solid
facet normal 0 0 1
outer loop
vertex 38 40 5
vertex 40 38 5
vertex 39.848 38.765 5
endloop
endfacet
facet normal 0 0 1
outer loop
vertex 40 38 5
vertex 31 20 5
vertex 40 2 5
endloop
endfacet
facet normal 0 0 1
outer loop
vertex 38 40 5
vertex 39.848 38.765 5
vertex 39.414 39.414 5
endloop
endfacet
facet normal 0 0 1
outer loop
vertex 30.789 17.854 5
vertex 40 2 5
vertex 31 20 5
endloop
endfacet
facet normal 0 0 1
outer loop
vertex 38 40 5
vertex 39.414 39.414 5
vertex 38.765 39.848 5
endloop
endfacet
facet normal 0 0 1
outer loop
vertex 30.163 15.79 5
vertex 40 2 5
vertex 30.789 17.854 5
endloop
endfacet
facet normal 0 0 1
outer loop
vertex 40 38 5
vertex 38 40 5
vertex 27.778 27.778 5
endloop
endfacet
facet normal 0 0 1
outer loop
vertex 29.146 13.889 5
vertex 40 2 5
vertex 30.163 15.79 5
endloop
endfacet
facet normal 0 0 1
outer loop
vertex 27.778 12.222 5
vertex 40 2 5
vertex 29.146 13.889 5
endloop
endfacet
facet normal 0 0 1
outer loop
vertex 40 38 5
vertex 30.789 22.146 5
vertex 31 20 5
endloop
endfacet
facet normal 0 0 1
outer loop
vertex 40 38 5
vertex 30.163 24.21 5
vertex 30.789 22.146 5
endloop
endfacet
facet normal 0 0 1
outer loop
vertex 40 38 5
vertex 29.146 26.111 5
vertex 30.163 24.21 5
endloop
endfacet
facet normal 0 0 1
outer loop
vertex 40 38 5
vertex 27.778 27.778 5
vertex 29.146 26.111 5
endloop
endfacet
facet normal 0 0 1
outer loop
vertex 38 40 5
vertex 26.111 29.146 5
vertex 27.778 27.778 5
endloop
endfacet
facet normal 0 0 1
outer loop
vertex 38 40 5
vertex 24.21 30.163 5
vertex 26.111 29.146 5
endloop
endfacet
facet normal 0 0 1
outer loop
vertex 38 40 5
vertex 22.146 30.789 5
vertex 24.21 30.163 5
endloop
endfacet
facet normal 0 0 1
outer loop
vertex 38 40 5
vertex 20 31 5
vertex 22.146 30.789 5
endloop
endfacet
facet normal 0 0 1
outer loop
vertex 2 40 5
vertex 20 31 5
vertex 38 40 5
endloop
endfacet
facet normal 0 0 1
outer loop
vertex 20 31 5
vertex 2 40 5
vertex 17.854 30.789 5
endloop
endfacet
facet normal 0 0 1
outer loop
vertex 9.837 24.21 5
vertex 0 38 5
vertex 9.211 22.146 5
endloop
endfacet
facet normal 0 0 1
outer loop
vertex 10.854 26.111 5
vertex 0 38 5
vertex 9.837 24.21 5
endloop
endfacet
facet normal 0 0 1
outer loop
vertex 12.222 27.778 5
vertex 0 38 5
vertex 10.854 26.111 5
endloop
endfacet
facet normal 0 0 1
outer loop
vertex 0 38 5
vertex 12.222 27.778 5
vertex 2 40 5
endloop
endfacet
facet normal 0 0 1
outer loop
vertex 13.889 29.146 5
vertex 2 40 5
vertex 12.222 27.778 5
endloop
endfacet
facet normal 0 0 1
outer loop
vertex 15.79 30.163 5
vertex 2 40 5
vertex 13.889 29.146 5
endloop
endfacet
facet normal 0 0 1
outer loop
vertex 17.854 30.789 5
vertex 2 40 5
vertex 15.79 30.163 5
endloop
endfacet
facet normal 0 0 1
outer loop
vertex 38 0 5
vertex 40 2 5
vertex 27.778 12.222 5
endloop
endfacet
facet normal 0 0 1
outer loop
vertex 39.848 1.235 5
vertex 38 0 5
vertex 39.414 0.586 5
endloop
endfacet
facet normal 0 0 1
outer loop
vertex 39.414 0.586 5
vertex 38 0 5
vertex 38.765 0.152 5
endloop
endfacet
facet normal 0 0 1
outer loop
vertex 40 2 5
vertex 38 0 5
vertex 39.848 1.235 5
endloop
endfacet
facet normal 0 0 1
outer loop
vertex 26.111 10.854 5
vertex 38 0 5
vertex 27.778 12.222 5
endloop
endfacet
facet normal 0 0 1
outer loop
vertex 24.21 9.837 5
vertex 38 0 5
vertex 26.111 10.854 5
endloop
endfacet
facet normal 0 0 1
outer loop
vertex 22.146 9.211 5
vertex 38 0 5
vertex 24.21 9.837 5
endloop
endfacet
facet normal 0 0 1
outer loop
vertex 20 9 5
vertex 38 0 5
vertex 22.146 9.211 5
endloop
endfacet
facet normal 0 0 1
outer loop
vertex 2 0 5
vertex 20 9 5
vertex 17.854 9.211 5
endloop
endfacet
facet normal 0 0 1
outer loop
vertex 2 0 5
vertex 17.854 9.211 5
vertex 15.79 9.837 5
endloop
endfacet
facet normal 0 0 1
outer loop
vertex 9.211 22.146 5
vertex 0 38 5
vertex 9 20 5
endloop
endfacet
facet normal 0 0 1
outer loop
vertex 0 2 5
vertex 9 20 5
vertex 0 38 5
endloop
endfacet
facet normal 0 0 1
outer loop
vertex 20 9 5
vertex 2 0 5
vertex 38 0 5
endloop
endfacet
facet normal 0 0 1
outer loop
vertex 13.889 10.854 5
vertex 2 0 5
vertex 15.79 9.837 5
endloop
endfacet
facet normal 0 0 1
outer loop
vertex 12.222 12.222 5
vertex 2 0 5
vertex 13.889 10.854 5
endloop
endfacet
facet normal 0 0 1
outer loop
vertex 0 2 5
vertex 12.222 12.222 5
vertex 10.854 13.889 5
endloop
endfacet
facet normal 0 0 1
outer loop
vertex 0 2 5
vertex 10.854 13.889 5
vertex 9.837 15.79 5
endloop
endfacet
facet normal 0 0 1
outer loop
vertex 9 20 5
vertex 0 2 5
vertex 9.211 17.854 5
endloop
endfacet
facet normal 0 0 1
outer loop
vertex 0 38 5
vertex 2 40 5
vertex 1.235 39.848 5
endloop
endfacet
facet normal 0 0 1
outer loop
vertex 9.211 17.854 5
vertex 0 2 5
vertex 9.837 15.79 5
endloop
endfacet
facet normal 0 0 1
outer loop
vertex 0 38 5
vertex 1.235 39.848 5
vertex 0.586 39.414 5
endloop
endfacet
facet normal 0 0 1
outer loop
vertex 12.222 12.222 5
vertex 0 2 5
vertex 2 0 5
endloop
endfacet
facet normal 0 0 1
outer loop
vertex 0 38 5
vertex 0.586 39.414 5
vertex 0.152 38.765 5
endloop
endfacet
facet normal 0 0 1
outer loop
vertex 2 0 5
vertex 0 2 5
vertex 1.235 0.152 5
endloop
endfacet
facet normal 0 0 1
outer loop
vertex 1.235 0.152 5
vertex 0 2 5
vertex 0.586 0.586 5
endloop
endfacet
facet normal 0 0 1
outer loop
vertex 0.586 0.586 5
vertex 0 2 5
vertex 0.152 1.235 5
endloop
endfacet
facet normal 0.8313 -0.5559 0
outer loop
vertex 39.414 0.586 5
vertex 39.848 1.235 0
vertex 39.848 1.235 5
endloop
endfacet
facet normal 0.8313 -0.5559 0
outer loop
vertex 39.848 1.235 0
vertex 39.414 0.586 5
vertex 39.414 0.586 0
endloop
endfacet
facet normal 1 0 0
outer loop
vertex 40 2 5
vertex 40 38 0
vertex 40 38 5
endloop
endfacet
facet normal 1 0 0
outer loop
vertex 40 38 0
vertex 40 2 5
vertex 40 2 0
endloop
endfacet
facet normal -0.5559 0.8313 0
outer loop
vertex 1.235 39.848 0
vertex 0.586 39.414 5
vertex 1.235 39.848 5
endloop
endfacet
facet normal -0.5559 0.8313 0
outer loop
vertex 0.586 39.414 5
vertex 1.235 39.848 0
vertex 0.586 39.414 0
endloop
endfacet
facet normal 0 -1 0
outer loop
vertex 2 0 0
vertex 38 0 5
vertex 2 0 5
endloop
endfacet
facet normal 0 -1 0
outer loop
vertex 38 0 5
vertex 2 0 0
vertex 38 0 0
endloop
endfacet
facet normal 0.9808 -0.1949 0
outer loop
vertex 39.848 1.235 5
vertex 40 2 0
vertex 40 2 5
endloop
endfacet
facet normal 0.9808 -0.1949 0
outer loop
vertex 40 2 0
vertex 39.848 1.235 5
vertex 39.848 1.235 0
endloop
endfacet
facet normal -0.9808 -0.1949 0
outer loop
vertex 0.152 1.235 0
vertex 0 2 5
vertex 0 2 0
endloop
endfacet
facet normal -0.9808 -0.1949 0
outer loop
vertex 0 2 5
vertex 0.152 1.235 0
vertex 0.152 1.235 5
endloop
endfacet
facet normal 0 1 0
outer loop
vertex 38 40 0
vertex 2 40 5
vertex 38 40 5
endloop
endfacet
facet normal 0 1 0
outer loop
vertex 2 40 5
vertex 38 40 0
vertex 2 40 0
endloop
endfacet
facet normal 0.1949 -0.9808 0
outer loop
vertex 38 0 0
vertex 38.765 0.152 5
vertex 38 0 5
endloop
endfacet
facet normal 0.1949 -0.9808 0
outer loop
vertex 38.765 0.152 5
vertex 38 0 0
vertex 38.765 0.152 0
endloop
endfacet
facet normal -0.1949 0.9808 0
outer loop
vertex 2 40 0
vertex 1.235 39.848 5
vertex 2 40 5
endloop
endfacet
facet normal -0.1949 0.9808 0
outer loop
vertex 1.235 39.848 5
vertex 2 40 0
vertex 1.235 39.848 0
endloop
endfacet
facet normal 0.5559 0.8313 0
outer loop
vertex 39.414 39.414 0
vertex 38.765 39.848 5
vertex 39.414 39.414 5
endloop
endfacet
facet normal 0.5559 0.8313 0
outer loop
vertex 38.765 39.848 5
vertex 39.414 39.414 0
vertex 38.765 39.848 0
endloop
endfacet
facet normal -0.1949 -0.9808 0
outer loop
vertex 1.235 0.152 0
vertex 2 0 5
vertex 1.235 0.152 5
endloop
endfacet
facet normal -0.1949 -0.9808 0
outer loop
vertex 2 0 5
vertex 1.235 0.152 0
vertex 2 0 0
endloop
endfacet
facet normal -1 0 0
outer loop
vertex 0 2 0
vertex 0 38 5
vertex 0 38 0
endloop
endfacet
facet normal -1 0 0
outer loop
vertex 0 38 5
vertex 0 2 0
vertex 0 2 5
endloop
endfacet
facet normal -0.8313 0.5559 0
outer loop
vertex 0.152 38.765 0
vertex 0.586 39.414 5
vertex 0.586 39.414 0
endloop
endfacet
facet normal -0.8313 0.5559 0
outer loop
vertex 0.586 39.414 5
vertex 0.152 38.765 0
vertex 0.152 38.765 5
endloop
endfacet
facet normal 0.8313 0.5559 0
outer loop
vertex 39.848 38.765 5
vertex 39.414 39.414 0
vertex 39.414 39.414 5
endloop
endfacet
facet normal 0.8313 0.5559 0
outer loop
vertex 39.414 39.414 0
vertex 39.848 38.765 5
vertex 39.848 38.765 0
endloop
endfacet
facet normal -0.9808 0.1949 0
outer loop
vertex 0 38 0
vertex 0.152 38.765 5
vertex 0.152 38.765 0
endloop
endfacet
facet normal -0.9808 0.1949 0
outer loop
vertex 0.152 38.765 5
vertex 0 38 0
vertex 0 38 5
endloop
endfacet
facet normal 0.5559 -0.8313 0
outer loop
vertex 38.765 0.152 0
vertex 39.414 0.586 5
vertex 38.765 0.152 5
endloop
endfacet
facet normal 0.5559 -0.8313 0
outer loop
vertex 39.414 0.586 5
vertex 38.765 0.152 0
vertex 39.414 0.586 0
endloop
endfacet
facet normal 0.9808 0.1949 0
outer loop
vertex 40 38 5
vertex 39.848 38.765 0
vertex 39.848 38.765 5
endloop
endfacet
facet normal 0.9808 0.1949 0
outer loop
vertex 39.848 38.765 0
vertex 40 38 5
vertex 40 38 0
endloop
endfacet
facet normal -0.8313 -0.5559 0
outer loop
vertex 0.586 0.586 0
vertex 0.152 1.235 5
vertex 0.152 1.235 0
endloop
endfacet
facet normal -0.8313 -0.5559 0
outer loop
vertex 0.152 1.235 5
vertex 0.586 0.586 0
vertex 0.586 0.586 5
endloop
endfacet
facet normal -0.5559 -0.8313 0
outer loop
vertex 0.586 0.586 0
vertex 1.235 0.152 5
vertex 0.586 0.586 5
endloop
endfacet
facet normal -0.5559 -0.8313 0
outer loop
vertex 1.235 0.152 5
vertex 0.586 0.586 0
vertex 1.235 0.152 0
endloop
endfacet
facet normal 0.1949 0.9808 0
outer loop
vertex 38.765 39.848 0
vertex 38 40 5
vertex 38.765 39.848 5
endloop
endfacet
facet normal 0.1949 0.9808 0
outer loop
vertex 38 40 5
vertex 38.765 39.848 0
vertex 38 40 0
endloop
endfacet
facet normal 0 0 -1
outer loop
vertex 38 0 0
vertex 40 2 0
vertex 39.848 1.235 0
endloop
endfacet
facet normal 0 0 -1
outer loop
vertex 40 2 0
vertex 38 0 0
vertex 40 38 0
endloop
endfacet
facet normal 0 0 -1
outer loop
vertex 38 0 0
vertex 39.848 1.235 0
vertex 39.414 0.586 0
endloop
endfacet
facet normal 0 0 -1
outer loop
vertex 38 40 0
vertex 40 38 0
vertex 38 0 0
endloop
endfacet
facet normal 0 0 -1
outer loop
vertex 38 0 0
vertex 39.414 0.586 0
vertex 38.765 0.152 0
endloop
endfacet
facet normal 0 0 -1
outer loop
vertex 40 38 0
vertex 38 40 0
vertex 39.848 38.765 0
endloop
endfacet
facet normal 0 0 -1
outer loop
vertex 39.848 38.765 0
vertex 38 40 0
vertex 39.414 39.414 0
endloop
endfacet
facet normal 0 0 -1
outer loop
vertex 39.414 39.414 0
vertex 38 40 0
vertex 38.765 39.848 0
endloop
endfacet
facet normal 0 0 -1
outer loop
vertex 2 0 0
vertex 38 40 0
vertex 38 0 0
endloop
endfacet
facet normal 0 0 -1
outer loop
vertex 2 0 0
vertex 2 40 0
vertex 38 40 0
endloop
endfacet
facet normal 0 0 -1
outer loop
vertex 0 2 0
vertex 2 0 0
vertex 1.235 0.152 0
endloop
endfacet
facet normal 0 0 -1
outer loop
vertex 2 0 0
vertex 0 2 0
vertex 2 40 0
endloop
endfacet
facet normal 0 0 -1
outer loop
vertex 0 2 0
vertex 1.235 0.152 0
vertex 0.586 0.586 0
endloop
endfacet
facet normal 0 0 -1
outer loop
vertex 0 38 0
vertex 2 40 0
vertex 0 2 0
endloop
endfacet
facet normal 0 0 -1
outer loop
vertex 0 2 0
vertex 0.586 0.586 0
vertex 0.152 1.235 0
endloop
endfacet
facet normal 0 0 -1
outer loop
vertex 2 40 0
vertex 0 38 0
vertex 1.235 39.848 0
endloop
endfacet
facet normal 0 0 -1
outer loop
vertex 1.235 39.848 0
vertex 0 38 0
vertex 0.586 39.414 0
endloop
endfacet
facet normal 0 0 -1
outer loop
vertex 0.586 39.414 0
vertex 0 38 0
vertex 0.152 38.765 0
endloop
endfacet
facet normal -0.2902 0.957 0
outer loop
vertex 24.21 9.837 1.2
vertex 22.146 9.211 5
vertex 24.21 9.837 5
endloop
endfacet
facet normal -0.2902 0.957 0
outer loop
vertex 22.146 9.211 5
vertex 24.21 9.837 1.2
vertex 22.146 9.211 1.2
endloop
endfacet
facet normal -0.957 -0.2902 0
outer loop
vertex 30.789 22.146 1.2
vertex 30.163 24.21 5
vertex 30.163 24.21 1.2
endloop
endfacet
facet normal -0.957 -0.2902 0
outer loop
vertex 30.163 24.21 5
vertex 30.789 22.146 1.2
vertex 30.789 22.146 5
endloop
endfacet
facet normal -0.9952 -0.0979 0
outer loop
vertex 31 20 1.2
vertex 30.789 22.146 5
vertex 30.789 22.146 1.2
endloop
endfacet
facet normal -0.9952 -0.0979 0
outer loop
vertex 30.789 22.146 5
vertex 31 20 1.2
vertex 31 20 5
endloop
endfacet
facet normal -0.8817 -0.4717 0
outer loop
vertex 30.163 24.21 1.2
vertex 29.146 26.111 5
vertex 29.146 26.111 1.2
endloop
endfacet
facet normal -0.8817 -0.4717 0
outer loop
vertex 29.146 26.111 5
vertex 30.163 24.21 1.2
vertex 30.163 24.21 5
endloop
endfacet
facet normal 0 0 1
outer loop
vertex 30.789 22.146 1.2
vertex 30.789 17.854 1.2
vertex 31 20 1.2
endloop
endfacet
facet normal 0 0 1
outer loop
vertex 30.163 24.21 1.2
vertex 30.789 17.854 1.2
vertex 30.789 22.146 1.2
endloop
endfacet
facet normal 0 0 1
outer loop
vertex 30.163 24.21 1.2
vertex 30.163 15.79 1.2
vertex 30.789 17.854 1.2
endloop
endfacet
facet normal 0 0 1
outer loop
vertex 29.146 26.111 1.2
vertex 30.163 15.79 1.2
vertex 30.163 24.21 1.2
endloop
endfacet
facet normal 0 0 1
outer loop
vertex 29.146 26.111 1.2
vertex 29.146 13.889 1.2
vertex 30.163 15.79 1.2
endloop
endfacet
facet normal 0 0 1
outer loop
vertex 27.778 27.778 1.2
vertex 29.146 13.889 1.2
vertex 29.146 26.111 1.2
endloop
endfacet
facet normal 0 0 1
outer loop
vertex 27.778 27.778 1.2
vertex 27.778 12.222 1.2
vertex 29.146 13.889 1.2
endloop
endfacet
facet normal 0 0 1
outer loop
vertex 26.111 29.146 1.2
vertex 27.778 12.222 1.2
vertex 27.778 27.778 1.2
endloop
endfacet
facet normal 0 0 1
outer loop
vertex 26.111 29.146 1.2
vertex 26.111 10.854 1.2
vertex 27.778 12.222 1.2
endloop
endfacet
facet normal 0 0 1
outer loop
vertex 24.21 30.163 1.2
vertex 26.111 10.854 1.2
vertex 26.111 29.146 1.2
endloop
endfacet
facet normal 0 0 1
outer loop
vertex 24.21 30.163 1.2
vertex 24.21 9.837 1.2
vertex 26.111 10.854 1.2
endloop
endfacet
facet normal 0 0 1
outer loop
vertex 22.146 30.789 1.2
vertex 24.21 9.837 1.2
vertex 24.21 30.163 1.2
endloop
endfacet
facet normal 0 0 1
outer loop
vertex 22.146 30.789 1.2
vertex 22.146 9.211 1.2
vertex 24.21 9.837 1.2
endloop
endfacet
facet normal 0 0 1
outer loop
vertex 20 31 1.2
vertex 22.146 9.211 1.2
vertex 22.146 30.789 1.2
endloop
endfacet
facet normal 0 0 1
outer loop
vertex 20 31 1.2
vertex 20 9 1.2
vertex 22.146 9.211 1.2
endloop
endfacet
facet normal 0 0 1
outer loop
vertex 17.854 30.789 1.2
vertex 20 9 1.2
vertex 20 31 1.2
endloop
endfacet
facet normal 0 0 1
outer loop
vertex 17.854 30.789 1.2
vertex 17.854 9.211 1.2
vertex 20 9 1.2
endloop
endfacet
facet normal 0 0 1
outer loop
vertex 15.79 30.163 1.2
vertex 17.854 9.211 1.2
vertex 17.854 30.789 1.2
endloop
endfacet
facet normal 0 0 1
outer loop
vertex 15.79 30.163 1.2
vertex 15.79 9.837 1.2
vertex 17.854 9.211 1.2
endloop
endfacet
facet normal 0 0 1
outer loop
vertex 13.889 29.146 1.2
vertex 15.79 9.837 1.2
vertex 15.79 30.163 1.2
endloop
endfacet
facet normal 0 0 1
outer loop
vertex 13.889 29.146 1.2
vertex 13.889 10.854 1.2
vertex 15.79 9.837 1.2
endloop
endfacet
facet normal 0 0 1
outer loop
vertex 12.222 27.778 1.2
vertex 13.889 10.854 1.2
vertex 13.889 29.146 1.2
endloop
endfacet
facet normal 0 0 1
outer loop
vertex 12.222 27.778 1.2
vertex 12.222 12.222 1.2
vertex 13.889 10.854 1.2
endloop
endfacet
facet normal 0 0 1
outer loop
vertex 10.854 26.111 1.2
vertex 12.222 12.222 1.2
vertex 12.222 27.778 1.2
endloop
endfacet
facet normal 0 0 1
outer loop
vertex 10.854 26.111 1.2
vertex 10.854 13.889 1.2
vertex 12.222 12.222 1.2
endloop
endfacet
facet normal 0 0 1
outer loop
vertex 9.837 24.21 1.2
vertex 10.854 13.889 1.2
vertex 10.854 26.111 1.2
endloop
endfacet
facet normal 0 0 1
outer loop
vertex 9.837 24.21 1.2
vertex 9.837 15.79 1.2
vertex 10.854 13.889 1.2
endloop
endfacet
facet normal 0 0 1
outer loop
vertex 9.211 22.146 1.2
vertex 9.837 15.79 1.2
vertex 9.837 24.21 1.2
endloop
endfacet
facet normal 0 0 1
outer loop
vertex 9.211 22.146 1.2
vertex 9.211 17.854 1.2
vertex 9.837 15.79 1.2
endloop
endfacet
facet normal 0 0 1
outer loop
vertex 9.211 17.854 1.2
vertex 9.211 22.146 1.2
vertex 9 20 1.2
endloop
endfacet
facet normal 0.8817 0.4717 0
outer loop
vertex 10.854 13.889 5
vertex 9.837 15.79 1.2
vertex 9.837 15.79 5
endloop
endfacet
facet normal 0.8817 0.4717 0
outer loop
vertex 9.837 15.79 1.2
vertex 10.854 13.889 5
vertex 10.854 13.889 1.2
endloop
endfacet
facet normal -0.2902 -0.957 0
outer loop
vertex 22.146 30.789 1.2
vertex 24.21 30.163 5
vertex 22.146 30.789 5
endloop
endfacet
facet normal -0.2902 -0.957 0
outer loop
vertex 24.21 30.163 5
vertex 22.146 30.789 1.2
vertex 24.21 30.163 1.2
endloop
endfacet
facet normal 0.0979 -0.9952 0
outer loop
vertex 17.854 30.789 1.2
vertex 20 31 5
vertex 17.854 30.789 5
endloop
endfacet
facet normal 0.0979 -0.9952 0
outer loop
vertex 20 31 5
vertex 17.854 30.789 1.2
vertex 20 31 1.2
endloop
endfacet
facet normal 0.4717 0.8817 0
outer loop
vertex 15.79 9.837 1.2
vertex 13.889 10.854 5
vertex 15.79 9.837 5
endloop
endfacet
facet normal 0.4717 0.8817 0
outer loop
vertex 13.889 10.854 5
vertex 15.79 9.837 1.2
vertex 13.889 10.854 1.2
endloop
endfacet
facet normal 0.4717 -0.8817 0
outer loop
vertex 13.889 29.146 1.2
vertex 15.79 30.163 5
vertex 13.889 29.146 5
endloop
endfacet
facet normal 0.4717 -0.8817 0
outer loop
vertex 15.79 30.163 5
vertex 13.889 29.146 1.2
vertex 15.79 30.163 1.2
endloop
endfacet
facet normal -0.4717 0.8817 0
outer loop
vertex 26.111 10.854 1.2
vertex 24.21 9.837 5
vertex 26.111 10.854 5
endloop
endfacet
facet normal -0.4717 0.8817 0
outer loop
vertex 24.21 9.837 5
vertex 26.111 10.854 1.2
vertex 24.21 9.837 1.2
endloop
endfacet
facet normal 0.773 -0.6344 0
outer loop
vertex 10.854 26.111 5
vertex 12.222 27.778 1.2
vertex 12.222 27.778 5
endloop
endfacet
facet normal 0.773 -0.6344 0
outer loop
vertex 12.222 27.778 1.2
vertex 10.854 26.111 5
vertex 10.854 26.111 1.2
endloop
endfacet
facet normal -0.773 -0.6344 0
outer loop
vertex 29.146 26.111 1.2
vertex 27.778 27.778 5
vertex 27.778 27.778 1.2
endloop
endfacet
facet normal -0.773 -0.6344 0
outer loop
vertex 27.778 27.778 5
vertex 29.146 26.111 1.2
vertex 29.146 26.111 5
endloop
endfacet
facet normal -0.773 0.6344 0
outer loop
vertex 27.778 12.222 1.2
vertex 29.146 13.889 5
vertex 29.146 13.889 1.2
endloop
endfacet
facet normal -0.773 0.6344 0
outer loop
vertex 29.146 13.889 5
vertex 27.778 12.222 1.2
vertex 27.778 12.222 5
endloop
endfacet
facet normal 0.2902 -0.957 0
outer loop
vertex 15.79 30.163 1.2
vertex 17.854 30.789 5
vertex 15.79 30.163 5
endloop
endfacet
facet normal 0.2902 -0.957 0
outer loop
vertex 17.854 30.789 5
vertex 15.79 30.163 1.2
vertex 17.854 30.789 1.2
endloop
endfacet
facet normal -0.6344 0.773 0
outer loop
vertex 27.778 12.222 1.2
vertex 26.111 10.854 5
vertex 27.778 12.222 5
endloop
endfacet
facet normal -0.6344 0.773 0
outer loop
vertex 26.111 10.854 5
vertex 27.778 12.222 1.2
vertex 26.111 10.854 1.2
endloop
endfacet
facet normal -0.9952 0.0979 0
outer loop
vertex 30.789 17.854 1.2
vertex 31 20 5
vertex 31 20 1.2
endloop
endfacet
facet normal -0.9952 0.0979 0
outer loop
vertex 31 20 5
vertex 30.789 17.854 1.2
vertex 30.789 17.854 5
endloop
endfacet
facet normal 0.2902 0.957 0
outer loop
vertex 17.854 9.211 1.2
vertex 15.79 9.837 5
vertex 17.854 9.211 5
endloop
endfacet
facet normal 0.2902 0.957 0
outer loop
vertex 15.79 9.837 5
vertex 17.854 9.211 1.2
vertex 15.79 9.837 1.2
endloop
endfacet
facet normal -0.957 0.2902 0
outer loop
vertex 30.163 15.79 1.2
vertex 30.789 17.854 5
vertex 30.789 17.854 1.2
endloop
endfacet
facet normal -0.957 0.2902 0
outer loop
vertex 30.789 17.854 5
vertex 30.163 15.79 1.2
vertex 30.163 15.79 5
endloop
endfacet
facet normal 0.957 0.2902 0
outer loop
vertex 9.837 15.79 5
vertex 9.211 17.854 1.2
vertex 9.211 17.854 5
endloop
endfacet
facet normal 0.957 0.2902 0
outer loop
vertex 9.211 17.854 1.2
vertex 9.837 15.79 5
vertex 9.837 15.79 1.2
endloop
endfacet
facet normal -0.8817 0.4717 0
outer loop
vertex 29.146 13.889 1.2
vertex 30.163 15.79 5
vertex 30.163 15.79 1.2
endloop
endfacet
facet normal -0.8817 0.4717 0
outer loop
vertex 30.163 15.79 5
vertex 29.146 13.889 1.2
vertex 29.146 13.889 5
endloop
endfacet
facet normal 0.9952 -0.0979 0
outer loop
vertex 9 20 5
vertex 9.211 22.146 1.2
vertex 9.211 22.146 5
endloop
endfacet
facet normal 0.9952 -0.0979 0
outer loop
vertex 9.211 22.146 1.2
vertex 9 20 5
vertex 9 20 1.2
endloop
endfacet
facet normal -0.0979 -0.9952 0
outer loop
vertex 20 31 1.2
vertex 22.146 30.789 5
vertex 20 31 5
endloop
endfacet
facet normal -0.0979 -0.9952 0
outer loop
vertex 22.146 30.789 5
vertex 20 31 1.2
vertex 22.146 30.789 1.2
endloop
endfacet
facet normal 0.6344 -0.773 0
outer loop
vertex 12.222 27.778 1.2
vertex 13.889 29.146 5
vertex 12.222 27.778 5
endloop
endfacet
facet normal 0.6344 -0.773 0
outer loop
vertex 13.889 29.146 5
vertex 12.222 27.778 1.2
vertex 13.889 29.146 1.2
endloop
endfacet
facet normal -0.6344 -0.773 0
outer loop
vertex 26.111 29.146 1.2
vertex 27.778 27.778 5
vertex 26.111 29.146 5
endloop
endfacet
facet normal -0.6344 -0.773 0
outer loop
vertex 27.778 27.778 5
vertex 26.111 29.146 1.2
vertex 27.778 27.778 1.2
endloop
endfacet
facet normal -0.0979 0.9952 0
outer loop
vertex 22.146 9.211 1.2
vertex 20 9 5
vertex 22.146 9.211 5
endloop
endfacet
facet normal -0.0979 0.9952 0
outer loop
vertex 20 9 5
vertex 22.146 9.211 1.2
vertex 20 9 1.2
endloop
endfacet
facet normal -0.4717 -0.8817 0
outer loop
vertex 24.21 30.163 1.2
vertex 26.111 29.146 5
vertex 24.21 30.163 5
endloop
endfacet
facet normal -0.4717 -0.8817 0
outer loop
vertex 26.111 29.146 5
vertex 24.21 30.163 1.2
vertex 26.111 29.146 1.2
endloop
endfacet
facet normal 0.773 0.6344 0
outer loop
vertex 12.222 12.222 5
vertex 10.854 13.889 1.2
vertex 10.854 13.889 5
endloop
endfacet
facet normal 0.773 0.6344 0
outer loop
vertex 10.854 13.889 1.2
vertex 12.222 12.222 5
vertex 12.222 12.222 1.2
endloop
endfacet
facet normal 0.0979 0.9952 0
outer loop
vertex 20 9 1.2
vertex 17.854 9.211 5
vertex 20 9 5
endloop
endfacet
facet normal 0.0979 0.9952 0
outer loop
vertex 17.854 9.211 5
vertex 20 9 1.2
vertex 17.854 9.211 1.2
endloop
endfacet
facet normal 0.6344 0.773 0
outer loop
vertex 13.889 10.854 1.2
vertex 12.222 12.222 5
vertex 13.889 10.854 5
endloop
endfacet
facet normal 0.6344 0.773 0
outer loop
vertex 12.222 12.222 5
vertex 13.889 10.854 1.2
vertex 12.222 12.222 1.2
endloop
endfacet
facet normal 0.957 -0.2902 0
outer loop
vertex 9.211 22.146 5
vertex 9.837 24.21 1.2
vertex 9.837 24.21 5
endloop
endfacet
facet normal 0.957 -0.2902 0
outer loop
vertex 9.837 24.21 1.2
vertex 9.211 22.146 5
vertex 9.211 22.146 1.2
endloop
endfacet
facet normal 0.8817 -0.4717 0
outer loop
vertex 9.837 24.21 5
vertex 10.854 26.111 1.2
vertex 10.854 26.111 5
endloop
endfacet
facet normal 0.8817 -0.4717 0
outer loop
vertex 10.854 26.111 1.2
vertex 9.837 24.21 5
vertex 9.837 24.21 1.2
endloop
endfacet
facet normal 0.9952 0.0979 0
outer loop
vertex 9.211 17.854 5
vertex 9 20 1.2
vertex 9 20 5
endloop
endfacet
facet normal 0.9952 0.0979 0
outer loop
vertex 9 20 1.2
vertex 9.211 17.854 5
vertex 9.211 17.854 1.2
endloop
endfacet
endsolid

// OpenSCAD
W = 40;
D = 40;
H = 5;
R = 2;
footR = 11;
thick = 1.2;

difference() {
    hull() {
        for (x = [R, W - R])
            for (y = [R, D - R])
                translate([x, y, 0])
                    cylinder(r = R, h = H, $fn = 16);
    }
    translate([W / 2, D / 2, thick])
        cylinder(r = footR, h = H, $fn = 32);
}
